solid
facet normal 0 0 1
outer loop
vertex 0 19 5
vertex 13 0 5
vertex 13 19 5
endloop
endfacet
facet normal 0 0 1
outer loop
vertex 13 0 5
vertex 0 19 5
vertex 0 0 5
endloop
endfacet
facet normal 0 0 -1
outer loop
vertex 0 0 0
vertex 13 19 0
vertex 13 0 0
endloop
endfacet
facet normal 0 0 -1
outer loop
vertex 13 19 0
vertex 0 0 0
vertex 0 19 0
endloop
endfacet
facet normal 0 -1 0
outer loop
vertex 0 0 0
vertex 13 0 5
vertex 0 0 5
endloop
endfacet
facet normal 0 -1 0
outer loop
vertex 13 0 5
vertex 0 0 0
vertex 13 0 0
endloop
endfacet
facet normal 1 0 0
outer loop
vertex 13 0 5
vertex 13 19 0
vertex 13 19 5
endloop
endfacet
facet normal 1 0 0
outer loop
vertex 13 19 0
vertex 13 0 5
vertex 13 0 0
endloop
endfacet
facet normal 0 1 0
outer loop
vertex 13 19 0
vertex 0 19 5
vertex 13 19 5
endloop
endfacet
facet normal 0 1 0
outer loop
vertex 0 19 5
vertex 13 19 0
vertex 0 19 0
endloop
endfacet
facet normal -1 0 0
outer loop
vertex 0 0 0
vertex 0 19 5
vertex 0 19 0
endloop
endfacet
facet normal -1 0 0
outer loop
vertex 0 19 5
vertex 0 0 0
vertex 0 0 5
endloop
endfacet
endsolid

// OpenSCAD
// Generated by SolidPython 1.0.1 on 2020-07-29 00:46:55


cube(size = [13, 19, 5]);
/***********************************************
*********      SolidPython code:      **********
************************************************
 
# import packages: SolidPython
from solid import *
from solid.utils import *
from itertools import chain, combinations, permutations


class Resize:

    def __init__(self, scad_file):
        self.scad_file = scad_file
        #self.scad_file = import_scad(scad_file)
        # cone/cylinder param:
        self.r1 = 0
        self.r2 = 0
        self.h = 0
        # rectangular prism param:
        self.w = 0
        self.l = 0
        # ellipse param:
        self.r = 0

    # import OpenScad code (file name corresponds to shape)


    # classify shape + parameters
    def assign(self, param1, param2, param3):
        if self.scad_file == 'cone.scad':
            self.r1 = param1
            self.r2 = param2
            self.h = param3
        elif self.scad_file == 'cylinder.scad':
            self.r1 = param1
            self.r2 = param2
            self.h = param3
        elif self.scad_file == 'rectangularPrism.scad':
            self.h = param1
            self.l = param2
            self.w = param3
        else:
            self.r = param1
            self.h = param2

    # resize parameters
    def iterate(self):
        x = range(3, 20, 2)
        i = 1
        if self.scad_file == 'cone.scad':
            tempList = list(permutations(x, 2))
            for temp in tempList:
                param1 = temp[0]
                param2 = temp[1]
                filepath = 'produced_scad_files/' + 'cone' + str(param1) + '_' + str(param2) + '_' + '.scad'
                scad_render_to_file(cylinder(h=param1, r1=param2, r2=0), filepath)

        elif self.scad_file == 'cylinder.scad':
            tempList = list(permutations(x, 3))
            for temp in tempList:
                param1 = temp[0]
                param2 = temp[1]
                filepath = 'produced_scad_files/' + 'cylinder' + str(param1) + '_' + str(param2) + '_' + '.scad'
                scad_render_to_file(cylinder(h=param1, r1=param2, r2=param2), filepath)

        elif self.scad_file == 'rectangularPrism.scad':
            tempList = list(permutations(x, 3))
            for temp in tempList:
                param1 = temp[0]
                param2 = temp[1]
                param3 = temp[2]
                filepath = 'produced_scad_files/' + 'rectangularPrism' + str(param1) + '_' + str(param2) + '_' + str(
                    param3) + '.scad'
                scad_render_to_file(cube(size=(param1, param2, param3)), filepath)

        elif self.scad_file == 'ellipse.scad':
            tempList = list(permutations(x, 4))
            for temp in tempList:
                param1 = temp[0]
                param2 = temp[1]
                param3 = temp[2]
                param4 = temp[3]
                filepath = 'produced_scad_files/' + 'ellipse' + str(param1) + '_' + str(param2) + '_' + str(param3) + '_' + str(param4) + '.scad'
                scad_render_to_file(scale([param1, param2, param3])(sphere(r=param4)), filepath)

    def render_to_scadfile(self):
        scad_render_to_file(scad, 'example.scad') 
 
************************************************/
